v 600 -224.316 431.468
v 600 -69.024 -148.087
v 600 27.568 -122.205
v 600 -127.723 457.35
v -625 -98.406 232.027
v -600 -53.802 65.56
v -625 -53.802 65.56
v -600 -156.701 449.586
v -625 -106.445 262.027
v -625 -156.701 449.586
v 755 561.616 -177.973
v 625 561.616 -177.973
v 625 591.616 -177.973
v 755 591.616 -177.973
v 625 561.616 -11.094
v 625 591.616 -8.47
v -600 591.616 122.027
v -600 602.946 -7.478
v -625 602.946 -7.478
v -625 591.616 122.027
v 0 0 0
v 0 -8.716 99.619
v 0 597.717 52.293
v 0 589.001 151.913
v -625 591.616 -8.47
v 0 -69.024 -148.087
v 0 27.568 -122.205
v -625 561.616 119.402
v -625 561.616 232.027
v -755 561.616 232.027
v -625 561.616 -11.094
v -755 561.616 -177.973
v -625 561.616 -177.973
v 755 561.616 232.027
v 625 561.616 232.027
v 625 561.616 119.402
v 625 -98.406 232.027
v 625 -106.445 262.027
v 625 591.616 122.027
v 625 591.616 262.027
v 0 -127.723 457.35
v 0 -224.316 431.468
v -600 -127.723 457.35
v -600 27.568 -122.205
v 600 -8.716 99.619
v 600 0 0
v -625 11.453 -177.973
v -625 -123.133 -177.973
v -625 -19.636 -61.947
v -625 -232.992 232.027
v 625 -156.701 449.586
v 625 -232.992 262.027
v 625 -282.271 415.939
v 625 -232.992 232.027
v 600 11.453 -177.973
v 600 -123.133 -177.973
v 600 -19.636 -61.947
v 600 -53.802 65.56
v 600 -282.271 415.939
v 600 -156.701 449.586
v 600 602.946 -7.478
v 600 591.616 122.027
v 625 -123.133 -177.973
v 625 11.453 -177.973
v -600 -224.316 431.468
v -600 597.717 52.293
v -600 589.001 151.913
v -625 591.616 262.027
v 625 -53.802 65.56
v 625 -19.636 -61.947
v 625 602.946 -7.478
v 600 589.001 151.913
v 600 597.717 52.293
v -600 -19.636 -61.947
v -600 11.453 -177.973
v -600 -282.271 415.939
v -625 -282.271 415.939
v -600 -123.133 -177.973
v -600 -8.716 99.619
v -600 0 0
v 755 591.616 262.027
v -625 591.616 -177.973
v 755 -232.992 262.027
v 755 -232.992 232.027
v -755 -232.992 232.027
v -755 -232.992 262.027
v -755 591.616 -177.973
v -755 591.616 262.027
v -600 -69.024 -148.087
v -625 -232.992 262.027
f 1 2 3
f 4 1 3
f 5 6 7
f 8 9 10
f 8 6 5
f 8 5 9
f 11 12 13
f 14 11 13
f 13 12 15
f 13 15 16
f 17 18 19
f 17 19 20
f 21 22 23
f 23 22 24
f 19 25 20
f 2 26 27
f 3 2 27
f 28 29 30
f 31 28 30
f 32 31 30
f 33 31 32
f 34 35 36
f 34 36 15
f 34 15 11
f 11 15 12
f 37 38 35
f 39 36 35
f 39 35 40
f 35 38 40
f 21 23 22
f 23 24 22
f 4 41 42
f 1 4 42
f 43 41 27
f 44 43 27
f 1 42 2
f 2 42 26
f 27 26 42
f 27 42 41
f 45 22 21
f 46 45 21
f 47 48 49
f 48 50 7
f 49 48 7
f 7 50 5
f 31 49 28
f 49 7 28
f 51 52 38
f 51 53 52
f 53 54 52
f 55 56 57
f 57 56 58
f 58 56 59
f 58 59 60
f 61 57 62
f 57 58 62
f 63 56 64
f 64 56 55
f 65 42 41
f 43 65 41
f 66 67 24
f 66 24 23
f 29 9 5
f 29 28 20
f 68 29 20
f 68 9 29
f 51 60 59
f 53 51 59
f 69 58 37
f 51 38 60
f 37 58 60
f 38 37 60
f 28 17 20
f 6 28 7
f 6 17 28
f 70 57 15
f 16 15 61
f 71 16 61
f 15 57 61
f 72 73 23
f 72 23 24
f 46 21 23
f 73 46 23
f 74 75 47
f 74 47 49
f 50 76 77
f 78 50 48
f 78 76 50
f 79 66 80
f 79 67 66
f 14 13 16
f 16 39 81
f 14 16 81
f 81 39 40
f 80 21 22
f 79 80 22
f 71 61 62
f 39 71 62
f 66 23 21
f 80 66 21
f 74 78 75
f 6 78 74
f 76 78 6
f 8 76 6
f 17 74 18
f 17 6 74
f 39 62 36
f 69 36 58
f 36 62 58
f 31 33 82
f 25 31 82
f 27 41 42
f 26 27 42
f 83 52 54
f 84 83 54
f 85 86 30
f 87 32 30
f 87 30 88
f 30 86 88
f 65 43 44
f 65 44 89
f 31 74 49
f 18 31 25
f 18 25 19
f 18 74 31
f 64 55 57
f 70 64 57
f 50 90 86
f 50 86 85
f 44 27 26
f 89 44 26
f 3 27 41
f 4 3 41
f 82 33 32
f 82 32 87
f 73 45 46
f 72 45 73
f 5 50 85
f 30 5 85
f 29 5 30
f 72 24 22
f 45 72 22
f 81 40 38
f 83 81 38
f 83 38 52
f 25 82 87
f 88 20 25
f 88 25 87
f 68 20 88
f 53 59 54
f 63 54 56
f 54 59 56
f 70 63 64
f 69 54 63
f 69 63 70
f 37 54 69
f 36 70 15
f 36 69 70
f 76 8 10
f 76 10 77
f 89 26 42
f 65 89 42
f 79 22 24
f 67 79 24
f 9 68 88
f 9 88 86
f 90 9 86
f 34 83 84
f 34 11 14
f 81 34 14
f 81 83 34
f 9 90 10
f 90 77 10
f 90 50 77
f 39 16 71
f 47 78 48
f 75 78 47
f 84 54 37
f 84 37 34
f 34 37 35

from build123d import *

# Parameters (mm, degrees)
F1_DEPTH = 600
F3_DEPTH = 600
F5_DEPTH = 25
F7_DEPTH = 130


with BuildPart() as f1:
    # F0 (on Right) → F1 (new body)
    with BuildSketch(Plane.YZ):
        Polygon((-8.715574, 99.61947), (0, 0), (597.716819, 52.293446), (589.001245, 151.912915), align=None)
        Polygon((27.568398, -122.20518), (-127.723029, 457.350316), (-224.315611, 431.468411), (-69.024184, -148.087085), align=None)
    extrude(amount=F1_DEPTH)


with BuildPart() as f3:
    # F2 (on face) → F3 (new body)
    with BuildSketch(Plane(origin=(0, 0, 0), x_dir=(0, -1, 0), z_dir=(-1, 0, 0))):
        Polygon((-597.716819, 52.293446), (0, 0), (8.715574, 99.61947), (-589.001245, 151.912915), align=None)
        Polygon((224.315611, 431.468411), (127.723029, 457.350316), (-27.568398, -122.20518), (69.024184, -148.087085), align=None)
    extrude(amount=F3_DEPTH)


with BuildPart() as f5:
    # F4 (on face) → F5 (new body)
    with BuildSketch(Plane.YZ.offset(600)):
        Polygon((-53.801513, 65.560366), (-156.700803, 449.585744), (-282.271161, 415.939269), (-123.132868, -177.972925), (11.453035, -177.972925), (-19.635986, -61.947116), align=None)
        Polygon((591.615917, 122.027075), (-53.801513, 65.560366), (-19.635986, -61.947116), (602.946163, -7.478236), align=None)
    extrude(amount=F5_DEPTH)

    # F6 (on face) → F7 (join)
    with BuildSketch(Plane.YZ.offset(625)):
        Polygon((-232.992037, 262.027075), (-232.992037, 232.027075), (561.615917, 232.027075), (561.615917, -177.972925), (591.615917, -177.972925), (591.615917, 262.027075), align=None)
    extrude(amount=F7_DEPTH)


with BuildPart() as f8_1:
    # F8: instance of F5
    add(f5.part.mirror(Plane.YZ))


solid = Compound([f1.part, f3.part, f5.part, f8_1.part])
